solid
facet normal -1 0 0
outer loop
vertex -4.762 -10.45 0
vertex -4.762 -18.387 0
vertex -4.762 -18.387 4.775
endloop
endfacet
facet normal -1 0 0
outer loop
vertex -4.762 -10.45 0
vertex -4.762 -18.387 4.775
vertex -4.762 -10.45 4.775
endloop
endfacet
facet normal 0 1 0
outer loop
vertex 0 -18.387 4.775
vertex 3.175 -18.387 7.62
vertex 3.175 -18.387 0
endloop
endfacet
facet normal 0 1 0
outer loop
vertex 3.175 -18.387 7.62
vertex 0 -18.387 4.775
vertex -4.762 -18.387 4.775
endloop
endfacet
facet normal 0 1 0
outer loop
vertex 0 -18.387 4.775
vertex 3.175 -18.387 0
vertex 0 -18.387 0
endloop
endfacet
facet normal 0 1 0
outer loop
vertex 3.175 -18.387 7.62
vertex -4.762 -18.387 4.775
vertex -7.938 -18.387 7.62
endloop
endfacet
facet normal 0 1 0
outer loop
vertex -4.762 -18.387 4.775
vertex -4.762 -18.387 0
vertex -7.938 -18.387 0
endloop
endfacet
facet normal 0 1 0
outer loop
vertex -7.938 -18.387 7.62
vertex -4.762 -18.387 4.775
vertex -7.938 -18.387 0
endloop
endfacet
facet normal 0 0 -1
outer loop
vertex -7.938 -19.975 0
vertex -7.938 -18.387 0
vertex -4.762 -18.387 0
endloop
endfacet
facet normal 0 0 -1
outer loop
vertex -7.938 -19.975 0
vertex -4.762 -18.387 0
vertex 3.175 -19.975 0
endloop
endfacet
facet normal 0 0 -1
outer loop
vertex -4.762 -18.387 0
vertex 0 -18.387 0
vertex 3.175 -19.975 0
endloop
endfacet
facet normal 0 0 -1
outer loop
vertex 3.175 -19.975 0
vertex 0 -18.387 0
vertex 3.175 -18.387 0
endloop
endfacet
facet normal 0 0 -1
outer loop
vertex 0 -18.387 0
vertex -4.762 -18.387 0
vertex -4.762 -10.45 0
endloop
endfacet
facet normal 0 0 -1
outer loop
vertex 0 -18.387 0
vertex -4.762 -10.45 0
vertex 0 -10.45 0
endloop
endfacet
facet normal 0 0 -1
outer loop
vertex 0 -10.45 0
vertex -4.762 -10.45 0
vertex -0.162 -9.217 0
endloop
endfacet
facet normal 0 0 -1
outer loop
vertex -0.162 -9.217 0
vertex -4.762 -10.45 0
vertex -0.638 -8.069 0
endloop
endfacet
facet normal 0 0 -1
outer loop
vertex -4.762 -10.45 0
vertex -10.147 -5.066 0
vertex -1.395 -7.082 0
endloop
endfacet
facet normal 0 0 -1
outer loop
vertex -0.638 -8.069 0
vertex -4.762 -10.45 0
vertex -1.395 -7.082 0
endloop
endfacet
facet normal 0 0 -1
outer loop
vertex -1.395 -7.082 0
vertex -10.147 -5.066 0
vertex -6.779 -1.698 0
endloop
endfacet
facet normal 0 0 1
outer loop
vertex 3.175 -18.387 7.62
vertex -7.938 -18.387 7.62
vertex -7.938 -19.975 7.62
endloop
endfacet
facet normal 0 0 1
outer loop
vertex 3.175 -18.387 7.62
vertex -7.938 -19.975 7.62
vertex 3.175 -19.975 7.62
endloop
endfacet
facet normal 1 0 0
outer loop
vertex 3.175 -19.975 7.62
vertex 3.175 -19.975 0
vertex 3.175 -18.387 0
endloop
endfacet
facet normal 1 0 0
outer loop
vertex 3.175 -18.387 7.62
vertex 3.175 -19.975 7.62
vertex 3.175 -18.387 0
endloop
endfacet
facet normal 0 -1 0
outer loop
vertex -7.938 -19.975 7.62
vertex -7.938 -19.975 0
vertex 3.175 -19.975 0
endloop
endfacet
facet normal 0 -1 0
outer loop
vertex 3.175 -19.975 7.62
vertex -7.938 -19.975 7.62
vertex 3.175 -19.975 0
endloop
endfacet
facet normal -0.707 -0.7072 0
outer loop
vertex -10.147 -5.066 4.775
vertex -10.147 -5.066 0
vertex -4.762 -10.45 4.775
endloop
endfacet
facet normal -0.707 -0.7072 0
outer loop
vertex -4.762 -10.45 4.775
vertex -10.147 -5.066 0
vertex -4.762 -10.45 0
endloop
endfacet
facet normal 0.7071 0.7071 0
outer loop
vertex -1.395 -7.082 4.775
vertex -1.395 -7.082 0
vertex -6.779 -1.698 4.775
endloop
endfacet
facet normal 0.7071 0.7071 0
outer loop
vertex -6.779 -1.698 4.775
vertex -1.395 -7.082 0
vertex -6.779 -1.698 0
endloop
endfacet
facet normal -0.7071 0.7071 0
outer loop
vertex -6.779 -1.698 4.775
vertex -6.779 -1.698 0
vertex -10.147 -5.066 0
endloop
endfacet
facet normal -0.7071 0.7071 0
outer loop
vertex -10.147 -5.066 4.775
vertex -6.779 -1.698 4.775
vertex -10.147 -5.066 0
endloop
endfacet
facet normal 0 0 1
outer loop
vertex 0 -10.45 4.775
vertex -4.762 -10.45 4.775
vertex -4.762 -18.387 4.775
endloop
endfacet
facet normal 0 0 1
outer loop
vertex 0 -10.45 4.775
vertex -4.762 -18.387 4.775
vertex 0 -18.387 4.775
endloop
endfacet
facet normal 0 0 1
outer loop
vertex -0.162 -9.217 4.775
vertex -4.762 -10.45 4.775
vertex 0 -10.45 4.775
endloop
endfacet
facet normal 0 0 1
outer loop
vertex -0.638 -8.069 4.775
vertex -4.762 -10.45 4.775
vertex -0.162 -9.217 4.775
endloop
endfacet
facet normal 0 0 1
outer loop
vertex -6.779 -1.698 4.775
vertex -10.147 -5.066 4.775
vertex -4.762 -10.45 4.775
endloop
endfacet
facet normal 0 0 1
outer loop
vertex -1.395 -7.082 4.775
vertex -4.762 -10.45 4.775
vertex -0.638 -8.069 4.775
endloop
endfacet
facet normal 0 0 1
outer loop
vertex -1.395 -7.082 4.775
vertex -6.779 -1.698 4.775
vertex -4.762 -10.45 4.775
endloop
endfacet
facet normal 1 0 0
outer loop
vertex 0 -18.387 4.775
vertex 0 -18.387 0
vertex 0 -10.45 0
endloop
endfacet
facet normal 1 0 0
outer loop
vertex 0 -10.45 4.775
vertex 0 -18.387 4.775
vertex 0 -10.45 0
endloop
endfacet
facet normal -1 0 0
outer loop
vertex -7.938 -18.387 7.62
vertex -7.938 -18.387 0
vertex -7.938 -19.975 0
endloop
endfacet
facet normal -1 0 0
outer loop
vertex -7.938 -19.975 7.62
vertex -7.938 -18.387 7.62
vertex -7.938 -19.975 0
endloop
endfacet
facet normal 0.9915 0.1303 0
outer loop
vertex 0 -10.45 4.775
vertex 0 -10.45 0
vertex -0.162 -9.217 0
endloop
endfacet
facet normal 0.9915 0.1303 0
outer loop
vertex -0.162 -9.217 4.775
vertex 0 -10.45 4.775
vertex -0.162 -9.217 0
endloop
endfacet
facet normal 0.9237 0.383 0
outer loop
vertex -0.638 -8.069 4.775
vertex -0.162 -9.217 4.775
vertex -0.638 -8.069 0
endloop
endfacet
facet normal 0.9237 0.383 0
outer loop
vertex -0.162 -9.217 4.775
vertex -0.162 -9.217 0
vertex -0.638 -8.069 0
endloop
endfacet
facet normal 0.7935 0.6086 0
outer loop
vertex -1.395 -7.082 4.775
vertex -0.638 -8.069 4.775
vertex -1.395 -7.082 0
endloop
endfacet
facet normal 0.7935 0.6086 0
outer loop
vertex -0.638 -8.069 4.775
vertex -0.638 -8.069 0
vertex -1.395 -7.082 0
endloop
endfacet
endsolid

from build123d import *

# Parameters (mm, degrees)
F1_DEPTH = 7.62
F0_W     = 4.7625
F0_H     = 7.9375
F2_DEPTH = 4.7752
F3_DEPTH = 3.175


with BuildPart() as f1:
    # F0 (on Top) → F1 (new body)
    with BuildSketch(Plane.XY):
        Polygon((0, -18.387259), (-4.7625, -18.387259), (-7.9375, -18.387259), (-7.9375, -19.974759), (3.175, -19.974759), (3.175, -18.387259), align=None)
    extrude(amount=F1_DEPTH)

    # F0 (on Top) → F2 (join)
    with BuildSketch(Plane.XY):
        with Locations((-2.38125, -14.418509)):
            Rectangle(F0_W, F0_H)
        with BuildLine():
            Line((-1.394904, -7.082163), (-4.7625, -10.449759))
            Line((-4.7625, -10.449759), (0, -10.449759))
            ThreePointArc((0, -10.449759), (-0.362524, -8.627229), (-1.394904, -7.082163))
        make_face()
        Polygon((-10.146717, -5.065542), (-4.7625, -10.449759), (-1.394904, -7.082163), (-6.779121, -1.697946), align=None)
    extrude(amount=F2_DEPTH)


with BuildPart() as f3:
    # F0 (on Top) → F3 (new body)
    with BuildSketch(Plane.XY):
        Polygon((30.061543, 3.299114), (11.011543, 3.299114), (11.011543, -22.100886), (49.111543, -22.100886), (49.111543, 3.299114), align=None)
        Polygon((27.521543, -6.860886), (30.061543, -6.860886), (32.601543, -6.860886), (32.601543, -11.940886), (27.521543, -11.940886), align=None, mode=Mode.SUBTRACT)
    extrude(amount=F3_DEPTH)


solid = f1.part
